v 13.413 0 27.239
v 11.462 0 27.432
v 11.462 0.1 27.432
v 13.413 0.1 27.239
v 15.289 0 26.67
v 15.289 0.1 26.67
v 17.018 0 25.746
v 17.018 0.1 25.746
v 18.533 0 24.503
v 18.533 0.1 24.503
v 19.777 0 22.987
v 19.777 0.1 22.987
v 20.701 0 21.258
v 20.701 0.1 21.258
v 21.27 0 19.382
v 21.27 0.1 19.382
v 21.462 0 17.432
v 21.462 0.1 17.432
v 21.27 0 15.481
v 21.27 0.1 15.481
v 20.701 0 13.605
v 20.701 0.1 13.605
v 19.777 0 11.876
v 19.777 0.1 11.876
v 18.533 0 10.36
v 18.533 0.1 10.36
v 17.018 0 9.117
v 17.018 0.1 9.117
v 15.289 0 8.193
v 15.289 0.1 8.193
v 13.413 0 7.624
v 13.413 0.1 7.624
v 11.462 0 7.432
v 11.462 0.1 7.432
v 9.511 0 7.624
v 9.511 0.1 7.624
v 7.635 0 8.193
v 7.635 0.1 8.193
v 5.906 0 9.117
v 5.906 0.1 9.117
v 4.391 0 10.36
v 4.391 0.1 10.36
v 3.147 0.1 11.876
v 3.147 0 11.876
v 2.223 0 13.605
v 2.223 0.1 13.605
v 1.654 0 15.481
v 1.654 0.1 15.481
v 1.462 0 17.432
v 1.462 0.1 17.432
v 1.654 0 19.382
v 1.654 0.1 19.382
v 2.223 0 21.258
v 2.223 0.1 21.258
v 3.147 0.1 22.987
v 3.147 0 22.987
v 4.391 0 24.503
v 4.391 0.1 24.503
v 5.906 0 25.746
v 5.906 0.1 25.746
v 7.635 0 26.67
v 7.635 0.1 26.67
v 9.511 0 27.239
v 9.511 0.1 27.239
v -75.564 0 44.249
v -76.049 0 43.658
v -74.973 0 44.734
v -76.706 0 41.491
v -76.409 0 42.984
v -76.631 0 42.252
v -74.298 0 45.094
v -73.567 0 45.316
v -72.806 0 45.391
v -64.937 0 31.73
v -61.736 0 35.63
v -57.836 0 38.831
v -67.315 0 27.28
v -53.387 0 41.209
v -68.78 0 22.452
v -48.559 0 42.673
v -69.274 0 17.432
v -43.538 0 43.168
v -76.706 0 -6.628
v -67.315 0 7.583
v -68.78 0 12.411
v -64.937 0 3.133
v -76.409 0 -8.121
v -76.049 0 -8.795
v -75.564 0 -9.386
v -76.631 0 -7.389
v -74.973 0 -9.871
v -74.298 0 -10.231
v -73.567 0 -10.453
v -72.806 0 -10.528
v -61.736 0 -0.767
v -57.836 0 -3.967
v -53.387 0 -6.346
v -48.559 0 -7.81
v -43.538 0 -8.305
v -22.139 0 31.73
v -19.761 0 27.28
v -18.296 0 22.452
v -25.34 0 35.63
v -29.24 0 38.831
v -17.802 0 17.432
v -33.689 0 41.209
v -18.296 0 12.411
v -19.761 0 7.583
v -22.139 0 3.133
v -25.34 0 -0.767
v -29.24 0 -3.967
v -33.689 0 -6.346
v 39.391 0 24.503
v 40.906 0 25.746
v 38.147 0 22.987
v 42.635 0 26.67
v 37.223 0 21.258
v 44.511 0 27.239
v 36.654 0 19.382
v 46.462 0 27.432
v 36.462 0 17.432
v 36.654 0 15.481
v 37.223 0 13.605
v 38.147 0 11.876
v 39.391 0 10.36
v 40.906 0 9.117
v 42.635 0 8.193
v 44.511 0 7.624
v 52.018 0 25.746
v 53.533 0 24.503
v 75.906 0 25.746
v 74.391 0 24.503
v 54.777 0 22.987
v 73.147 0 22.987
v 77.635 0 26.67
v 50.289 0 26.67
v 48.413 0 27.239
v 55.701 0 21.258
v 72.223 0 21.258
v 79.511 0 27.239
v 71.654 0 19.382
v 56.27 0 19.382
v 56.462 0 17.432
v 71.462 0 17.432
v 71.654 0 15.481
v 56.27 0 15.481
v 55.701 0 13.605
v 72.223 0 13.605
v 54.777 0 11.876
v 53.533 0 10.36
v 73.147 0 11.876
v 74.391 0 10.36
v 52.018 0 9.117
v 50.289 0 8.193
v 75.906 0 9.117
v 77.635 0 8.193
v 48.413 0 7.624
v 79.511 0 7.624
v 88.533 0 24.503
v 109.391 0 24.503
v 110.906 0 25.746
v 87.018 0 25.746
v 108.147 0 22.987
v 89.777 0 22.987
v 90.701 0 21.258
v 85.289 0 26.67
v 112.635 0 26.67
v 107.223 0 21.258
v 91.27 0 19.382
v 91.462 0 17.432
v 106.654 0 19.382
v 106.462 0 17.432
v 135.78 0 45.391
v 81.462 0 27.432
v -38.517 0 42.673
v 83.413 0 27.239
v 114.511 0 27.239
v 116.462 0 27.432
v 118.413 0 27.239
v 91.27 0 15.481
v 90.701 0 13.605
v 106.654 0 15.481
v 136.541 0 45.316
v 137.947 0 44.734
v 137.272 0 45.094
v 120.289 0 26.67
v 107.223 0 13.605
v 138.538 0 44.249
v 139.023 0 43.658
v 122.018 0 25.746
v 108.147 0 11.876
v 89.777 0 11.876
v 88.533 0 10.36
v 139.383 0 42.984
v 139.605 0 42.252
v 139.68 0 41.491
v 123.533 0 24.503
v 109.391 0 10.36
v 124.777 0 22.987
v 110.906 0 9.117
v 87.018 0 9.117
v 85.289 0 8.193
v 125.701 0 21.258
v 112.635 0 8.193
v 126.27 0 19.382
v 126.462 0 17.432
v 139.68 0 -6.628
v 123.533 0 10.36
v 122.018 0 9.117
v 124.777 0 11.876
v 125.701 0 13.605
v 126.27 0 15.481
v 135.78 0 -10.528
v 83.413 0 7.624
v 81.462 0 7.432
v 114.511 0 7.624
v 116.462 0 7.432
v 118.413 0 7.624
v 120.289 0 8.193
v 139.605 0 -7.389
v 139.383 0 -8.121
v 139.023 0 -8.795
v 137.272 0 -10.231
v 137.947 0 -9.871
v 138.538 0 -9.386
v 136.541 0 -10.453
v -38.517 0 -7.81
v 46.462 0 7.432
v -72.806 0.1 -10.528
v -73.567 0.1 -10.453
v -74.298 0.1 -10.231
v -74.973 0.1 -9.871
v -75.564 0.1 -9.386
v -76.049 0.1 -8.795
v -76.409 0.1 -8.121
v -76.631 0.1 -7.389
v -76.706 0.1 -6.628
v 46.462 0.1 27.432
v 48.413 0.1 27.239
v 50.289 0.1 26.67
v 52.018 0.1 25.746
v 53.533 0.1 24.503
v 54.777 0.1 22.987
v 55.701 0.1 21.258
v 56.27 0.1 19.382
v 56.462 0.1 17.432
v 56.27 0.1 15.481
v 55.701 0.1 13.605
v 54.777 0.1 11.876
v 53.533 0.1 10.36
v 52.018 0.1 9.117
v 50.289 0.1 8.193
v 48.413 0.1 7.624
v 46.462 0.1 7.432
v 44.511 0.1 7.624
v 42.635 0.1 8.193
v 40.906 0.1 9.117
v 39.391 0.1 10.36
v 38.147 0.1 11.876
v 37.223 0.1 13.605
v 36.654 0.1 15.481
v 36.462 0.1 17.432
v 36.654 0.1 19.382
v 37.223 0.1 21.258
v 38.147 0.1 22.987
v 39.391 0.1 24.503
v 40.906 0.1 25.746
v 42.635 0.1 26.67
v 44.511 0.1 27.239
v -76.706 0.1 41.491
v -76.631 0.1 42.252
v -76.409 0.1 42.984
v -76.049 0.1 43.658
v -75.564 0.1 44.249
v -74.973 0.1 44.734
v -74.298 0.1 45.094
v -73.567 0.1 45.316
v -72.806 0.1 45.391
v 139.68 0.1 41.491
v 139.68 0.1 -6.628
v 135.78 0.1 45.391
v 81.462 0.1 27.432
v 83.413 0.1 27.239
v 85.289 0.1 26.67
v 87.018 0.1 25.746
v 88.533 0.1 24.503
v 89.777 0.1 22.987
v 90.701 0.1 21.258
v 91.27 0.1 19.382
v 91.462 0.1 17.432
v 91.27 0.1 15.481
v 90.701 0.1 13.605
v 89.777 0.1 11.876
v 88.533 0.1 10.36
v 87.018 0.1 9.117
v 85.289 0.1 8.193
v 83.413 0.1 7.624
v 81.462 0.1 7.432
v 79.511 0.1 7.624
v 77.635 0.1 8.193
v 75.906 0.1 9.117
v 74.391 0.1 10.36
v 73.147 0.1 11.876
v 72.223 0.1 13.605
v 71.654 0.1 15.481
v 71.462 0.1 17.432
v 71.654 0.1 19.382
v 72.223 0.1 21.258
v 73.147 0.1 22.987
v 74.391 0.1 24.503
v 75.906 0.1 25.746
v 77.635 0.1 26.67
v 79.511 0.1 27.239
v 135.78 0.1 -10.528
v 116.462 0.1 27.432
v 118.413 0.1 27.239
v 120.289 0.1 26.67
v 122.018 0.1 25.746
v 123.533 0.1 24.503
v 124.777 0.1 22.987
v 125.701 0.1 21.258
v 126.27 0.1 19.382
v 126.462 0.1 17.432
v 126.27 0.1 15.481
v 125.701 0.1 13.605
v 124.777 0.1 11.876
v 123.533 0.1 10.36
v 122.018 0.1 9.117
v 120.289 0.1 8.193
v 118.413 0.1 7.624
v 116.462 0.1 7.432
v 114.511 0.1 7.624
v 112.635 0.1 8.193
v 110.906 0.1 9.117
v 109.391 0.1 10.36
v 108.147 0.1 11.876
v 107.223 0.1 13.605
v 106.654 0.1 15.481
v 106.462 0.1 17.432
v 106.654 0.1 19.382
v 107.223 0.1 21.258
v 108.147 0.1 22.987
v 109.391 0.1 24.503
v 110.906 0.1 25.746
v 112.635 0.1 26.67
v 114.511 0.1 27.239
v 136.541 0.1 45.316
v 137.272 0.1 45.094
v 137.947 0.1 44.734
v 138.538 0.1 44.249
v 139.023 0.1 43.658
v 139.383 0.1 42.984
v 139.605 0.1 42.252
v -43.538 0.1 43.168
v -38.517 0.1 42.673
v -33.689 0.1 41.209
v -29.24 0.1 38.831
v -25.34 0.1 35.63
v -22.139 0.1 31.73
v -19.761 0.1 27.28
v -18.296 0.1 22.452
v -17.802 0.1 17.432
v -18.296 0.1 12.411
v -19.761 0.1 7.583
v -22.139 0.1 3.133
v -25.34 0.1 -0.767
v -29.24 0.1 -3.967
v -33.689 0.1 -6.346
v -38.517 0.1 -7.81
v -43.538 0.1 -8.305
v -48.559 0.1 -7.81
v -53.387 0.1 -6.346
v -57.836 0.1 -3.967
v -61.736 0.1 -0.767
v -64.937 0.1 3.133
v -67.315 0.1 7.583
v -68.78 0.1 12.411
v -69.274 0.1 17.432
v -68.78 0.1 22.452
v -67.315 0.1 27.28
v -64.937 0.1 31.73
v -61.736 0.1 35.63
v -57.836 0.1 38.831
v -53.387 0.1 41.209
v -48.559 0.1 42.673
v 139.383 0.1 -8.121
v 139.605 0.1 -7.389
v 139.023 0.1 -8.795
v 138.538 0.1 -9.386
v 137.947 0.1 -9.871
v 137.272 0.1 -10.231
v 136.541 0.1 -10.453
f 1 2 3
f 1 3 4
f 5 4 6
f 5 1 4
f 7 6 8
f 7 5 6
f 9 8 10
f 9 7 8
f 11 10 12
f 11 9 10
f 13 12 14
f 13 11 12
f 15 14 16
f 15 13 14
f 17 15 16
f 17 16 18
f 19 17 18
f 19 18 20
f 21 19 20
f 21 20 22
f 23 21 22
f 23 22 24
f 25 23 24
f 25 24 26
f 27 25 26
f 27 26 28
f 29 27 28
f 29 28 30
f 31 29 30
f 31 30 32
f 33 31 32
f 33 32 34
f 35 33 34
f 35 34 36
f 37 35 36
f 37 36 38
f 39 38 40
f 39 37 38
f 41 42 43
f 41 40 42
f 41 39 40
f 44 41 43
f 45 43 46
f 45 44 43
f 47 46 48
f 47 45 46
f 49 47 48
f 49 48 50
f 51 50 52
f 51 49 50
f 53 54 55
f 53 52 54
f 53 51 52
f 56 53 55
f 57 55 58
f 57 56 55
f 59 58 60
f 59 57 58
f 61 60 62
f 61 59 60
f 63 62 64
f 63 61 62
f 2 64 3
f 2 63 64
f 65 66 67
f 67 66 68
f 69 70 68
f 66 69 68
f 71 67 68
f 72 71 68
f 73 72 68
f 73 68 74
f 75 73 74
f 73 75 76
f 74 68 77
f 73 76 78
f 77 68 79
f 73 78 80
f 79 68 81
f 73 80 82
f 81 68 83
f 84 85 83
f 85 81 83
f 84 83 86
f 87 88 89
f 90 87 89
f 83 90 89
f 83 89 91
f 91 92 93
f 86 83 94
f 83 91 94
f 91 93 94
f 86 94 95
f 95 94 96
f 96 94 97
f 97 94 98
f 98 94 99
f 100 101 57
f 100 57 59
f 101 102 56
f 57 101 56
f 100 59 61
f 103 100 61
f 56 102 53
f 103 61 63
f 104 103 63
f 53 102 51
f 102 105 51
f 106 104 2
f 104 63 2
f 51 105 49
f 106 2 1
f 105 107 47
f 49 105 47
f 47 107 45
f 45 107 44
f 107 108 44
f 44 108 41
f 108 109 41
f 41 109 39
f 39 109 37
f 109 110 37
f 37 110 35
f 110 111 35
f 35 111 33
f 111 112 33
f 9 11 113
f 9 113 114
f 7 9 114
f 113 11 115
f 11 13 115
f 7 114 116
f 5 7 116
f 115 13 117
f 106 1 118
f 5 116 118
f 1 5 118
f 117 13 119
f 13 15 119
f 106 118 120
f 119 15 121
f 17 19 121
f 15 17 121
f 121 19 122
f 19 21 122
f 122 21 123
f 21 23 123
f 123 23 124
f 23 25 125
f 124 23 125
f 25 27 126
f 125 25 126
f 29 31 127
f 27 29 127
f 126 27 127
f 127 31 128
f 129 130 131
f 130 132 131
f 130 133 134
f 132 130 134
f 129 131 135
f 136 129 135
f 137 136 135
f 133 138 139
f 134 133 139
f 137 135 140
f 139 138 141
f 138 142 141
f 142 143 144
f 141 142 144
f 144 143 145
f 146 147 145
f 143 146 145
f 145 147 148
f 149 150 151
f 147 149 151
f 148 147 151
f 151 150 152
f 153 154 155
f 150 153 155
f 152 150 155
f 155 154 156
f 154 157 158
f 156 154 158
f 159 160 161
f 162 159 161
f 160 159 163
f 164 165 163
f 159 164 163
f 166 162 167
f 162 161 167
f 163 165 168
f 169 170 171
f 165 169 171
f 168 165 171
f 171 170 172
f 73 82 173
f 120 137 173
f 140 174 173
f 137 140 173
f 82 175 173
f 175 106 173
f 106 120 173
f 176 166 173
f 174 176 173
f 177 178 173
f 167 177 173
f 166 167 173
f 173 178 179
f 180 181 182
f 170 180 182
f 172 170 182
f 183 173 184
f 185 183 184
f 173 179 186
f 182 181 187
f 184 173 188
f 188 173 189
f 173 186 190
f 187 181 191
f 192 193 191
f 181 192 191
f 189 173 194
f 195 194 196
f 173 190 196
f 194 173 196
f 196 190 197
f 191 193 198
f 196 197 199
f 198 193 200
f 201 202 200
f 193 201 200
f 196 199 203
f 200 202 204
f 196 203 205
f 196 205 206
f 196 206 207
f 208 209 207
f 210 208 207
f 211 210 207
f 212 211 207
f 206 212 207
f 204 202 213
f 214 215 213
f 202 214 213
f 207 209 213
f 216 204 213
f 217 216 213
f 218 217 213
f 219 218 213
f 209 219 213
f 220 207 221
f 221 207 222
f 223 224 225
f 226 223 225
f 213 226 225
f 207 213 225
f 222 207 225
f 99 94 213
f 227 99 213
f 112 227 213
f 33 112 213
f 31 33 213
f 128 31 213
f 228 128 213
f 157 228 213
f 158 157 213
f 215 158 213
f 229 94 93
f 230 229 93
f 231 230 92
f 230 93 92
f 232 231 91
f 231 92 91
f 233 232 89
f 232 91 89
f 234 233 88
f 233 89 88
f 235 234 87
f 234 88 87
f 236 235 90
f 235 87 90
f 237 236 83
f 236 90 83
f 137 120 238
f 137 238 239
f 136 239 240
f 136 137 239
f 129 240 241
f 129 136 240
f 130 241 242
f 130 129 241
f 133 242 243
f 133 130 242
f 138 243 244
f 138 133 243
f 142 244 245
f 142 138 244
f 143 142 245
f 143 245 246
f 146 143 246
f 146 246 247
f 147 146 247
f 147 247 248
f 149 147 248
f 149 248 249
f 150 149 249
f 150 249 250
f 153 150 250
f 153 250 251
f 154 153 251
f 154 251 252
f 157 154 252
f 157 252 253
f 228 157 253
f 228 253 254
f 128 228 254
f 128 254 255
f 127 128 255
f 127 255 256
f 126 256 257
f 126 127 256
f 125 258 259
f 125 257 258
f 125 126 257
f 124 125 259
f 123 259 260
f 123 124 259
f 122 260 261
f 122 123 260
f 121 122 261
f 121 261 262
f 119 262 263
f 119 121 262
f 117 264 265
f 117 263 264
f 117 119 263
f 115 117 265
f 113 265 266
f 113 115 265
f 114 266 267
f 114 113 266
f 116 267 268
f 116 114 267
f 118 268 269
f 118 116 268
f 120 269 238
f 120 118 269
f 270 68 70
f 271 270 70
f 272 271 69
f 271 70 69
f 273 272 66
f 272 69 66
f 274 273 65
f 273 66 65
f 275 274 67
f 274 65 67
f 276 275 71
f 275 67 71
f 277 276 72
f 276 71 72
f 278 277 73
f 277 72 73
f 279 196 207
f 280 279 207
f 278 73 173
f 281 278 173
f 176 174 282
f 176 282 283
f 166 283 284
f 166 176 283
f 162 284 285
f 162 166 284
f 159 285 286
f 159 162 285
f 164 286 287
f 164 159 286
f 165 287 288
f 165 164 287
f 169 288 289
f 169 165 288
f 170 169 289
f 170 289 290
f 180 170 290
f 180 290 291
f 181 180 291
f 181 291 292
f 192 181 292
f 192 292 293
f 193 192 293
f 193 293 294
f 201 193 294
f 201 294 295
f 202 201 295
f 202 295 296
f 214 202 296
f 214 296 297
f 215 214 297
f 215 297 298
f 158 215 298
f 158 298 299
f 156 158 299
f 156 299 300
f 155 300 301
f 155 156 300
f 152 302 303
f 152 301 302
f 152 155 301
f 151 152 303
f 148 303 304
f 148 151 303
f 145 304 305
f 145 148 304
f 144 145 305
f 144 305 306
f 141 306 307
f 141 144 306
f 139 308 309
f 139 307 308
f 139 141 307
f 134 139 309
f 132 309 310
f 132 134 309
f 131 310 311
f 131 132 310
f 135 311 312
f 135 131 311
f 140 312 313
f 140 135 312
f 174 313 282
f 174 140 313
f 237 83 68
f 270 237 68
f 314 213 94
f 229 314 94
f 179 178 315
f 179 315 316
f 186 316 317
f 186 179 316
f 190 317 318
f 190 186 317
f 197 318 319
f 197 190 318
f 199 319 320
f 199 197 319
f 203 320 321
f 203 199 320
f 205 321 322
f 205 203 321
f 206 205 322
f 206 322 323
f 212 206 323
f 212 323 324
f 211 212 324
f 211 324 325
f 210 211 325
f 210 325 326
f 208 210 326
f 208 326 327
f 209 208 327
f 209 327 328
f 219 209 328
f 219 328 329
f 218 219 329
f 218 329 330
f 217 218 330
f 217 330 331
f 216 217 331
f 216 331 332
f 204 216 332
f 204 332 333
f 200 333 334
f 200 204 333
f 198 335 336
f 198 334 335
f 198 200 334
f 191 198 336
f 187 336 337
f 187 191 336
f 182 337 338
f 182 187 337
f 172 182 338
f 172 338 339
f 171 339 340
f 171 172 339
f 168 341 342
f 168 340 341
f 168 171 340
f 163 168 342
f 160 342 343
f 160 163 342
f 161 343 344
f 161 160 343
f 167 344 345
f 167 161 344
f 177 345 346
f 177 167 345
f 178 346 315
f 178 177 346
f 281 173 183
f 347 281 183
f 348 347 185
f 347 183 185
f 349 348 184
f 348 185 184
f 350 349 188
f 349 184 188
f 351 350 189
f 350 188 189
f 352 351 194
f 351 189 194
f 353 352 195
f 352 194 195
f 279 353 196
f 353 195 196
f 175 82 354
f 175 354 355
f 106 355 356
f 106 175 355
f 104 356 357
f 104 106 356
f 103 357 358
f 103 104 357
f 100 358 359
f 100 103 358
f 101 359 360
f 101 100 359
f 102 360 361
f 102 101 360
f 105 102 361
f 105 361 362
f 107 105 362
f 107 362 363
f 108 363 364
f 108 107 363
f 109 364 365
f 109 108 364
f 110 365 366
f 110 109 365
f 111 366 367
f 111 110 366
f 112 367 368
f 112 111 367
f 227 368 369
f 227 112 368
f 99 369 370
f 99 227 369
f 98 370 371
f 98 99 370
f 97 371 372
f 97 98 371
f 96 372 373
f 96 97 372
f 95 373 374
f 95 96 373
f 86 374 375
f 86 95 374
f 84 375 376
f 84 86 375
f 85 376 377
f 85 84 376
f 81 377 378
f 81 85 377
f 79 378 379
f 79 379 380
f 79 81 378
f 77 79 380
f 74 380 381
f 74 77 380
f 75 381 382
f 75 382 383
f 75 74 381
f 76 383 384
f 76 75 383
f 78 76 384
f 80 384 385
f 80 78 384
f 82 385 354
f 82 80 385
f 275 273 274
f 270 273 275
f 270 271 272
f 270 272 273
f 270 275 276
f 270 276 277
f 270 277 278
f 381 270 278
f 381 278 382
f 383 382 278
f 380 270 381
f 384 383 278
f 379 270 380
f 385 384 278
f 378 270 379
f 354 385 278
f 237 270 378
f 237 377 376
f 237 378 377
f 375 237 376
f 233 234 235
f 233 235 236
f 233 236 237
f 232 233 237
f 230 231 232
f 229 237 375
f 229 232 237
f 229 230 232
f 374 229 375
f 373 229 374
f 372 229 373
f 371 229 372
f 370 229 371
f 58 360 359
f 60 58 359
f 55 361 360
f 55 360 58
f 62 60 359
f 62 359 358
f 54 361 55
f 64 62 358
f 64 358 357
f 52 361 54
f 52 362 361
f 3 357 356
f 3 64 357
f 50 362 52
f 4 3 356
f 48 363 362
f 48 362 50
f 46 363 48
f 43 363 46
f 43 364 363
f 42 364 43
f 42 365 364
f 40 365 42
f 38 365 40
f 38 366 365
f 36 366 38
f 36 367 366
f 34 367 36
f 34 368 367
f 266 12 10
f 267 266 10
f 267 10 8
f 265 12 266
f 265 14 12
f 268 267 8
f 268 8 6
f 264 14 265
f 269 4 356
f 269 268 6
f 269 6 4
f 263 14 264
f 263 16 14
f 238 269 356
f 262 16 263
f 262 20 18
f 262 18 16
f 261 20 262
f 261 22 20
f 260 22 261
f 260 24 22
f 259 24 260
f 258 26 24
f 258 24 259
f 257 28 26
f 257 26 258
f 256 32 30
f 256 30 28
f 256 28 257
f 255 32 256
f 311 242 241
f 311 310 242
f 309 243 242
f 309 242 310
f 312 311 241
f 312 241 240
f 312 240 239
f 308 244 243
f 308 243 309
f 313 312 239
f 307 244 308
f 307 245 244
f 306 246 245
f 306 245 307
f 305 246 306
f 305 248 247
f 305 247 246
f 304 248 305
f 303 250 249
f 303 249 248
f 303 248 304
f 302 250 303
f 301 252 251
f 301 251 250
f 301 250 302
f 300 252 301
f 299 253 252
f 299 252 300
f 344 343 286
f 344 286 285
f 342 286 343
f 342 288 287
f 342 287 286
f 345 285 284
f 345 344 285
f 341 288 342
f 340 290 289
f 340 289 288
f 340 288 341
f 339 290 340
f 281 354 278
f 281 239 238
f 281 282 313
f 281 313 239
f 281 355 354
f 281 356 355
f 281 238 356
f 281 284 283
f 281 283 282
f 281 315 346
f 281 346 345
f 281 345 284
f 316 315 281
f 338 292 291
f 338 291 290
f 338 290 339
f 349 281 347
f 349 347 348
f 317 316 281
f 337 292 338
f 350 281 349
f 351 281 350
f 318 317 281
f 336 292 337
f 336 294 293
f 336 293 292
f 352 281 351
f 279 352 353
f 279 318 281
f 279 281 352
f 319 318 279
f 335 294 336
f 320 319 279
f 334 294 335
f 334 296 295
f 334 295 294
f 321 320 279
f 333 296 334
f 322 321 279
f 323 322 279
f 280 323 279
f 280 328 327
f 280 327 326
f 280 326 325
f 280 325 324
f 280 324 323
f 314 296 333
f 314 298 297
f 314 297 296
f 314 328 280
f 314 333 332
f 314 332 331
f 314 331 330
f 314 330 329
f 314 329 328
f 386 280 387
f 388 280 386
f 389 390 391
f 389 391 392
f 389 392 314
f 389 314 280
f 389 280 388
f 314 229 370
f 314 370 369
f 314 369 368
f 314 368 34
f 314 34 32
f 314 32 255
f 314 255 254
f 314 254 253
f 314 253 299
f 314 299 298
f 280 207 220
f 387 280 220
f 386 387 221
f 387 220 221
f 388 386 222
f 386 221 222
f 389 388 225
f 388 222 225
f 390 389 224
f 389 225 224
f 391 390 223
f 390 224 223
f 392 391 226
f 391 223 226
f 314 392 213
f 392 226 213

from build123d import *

# Parameters (mm, degrees)
SKETCH1_R               = 25.736334191
BOSS_EXTRUDE1_DEPTH     = 0.1
CUT_EXTRUDE1_DEPTH      = 147.870107232
CUT_EXTRUDE1_DEPTH_BACK = 147.870107232
SKETCH2_R               = 10


with BuildPart() as part:
    # Sketch1 → Boss-Extrude1 (new body)
    with BuildSketch(Plane(origin=(0, 0, 0), x_dir=(1, 0, 0), z_dir=(0, 1, 0))):
        with BuildLine():
            Line((-76.705846626, 6.628303893), (-76.705846626, -41.491355388))
            ThreePointArc((-76.705846626, -41.491355388), (-75.563563073, -44.249071834), (-72.805846626, -45.391355388))
            Line((-72.805846626, -45.391355388), (135.779788281, -45.391355388))
            ThreePointArc((135.779788281, -45.391355388), (138.537504728, -44.249071834), (139.679788281, -41.491355388))
            Line((139.679788281, -41.491355388), (139.679788281, 6.628303893))
            ThreePointArc((139.679788281, 6.628303893), (138.537504728, 9.386020339), (135.779788281, 10.528303893))
            Line((135.779788281, 10.528303893), (-72.805846626, 10.528303893))
            ThreePointArc((-72.805846626, 10.528303893), (-75.563563073, 9.386020339), (-76.705846626, 6.628303893))
        make_face()
        with Locations(Location((-43.538029172, -17.431525748, 0), (0, 0, 270))):
            Circle(SKETCH1_R, mode=Mode.SUBTRACT)
    extrude(amount=BOSS_EXTRUDE1_DEPTH)

    # Sketch2 → Cut-Extrude1 (cut, two sides: drawn at the far end of the back side and taken through both)
    with BuildSketch(Plane(origin=(0, 0.1, 0), x_dir=(1, 0, 0), z_dir=(0, 1, 0)).offset(-CUT_EXTRUDE1_DEPTH_BACK)):
        with Locations(Location((11.461970828, -17.431525748, 0), (0, 0, 270))):
            Circle(SKETCH2_R)
        with Locations(Location((46.461970828, -17.431525748, 0), (0, 0, 270))):
            Circle(SKETCH2_R)
        with Locations(Location((81.461970828, -17.431525748, 0), (0, 0, 270))):
            Circle(SKETCH2_R)
        with Locations(Location((116.461970828, -17.431525748, 0), (0, 0, 270))):
            Circle(SKETCH2_R)
    extrude(amount=CUT_EXTRUDE1_DEPTH + CUT_EXTRUDE1_DEPTH_BACK, mode=Mode.SUBTRACT)


solid = part.part
